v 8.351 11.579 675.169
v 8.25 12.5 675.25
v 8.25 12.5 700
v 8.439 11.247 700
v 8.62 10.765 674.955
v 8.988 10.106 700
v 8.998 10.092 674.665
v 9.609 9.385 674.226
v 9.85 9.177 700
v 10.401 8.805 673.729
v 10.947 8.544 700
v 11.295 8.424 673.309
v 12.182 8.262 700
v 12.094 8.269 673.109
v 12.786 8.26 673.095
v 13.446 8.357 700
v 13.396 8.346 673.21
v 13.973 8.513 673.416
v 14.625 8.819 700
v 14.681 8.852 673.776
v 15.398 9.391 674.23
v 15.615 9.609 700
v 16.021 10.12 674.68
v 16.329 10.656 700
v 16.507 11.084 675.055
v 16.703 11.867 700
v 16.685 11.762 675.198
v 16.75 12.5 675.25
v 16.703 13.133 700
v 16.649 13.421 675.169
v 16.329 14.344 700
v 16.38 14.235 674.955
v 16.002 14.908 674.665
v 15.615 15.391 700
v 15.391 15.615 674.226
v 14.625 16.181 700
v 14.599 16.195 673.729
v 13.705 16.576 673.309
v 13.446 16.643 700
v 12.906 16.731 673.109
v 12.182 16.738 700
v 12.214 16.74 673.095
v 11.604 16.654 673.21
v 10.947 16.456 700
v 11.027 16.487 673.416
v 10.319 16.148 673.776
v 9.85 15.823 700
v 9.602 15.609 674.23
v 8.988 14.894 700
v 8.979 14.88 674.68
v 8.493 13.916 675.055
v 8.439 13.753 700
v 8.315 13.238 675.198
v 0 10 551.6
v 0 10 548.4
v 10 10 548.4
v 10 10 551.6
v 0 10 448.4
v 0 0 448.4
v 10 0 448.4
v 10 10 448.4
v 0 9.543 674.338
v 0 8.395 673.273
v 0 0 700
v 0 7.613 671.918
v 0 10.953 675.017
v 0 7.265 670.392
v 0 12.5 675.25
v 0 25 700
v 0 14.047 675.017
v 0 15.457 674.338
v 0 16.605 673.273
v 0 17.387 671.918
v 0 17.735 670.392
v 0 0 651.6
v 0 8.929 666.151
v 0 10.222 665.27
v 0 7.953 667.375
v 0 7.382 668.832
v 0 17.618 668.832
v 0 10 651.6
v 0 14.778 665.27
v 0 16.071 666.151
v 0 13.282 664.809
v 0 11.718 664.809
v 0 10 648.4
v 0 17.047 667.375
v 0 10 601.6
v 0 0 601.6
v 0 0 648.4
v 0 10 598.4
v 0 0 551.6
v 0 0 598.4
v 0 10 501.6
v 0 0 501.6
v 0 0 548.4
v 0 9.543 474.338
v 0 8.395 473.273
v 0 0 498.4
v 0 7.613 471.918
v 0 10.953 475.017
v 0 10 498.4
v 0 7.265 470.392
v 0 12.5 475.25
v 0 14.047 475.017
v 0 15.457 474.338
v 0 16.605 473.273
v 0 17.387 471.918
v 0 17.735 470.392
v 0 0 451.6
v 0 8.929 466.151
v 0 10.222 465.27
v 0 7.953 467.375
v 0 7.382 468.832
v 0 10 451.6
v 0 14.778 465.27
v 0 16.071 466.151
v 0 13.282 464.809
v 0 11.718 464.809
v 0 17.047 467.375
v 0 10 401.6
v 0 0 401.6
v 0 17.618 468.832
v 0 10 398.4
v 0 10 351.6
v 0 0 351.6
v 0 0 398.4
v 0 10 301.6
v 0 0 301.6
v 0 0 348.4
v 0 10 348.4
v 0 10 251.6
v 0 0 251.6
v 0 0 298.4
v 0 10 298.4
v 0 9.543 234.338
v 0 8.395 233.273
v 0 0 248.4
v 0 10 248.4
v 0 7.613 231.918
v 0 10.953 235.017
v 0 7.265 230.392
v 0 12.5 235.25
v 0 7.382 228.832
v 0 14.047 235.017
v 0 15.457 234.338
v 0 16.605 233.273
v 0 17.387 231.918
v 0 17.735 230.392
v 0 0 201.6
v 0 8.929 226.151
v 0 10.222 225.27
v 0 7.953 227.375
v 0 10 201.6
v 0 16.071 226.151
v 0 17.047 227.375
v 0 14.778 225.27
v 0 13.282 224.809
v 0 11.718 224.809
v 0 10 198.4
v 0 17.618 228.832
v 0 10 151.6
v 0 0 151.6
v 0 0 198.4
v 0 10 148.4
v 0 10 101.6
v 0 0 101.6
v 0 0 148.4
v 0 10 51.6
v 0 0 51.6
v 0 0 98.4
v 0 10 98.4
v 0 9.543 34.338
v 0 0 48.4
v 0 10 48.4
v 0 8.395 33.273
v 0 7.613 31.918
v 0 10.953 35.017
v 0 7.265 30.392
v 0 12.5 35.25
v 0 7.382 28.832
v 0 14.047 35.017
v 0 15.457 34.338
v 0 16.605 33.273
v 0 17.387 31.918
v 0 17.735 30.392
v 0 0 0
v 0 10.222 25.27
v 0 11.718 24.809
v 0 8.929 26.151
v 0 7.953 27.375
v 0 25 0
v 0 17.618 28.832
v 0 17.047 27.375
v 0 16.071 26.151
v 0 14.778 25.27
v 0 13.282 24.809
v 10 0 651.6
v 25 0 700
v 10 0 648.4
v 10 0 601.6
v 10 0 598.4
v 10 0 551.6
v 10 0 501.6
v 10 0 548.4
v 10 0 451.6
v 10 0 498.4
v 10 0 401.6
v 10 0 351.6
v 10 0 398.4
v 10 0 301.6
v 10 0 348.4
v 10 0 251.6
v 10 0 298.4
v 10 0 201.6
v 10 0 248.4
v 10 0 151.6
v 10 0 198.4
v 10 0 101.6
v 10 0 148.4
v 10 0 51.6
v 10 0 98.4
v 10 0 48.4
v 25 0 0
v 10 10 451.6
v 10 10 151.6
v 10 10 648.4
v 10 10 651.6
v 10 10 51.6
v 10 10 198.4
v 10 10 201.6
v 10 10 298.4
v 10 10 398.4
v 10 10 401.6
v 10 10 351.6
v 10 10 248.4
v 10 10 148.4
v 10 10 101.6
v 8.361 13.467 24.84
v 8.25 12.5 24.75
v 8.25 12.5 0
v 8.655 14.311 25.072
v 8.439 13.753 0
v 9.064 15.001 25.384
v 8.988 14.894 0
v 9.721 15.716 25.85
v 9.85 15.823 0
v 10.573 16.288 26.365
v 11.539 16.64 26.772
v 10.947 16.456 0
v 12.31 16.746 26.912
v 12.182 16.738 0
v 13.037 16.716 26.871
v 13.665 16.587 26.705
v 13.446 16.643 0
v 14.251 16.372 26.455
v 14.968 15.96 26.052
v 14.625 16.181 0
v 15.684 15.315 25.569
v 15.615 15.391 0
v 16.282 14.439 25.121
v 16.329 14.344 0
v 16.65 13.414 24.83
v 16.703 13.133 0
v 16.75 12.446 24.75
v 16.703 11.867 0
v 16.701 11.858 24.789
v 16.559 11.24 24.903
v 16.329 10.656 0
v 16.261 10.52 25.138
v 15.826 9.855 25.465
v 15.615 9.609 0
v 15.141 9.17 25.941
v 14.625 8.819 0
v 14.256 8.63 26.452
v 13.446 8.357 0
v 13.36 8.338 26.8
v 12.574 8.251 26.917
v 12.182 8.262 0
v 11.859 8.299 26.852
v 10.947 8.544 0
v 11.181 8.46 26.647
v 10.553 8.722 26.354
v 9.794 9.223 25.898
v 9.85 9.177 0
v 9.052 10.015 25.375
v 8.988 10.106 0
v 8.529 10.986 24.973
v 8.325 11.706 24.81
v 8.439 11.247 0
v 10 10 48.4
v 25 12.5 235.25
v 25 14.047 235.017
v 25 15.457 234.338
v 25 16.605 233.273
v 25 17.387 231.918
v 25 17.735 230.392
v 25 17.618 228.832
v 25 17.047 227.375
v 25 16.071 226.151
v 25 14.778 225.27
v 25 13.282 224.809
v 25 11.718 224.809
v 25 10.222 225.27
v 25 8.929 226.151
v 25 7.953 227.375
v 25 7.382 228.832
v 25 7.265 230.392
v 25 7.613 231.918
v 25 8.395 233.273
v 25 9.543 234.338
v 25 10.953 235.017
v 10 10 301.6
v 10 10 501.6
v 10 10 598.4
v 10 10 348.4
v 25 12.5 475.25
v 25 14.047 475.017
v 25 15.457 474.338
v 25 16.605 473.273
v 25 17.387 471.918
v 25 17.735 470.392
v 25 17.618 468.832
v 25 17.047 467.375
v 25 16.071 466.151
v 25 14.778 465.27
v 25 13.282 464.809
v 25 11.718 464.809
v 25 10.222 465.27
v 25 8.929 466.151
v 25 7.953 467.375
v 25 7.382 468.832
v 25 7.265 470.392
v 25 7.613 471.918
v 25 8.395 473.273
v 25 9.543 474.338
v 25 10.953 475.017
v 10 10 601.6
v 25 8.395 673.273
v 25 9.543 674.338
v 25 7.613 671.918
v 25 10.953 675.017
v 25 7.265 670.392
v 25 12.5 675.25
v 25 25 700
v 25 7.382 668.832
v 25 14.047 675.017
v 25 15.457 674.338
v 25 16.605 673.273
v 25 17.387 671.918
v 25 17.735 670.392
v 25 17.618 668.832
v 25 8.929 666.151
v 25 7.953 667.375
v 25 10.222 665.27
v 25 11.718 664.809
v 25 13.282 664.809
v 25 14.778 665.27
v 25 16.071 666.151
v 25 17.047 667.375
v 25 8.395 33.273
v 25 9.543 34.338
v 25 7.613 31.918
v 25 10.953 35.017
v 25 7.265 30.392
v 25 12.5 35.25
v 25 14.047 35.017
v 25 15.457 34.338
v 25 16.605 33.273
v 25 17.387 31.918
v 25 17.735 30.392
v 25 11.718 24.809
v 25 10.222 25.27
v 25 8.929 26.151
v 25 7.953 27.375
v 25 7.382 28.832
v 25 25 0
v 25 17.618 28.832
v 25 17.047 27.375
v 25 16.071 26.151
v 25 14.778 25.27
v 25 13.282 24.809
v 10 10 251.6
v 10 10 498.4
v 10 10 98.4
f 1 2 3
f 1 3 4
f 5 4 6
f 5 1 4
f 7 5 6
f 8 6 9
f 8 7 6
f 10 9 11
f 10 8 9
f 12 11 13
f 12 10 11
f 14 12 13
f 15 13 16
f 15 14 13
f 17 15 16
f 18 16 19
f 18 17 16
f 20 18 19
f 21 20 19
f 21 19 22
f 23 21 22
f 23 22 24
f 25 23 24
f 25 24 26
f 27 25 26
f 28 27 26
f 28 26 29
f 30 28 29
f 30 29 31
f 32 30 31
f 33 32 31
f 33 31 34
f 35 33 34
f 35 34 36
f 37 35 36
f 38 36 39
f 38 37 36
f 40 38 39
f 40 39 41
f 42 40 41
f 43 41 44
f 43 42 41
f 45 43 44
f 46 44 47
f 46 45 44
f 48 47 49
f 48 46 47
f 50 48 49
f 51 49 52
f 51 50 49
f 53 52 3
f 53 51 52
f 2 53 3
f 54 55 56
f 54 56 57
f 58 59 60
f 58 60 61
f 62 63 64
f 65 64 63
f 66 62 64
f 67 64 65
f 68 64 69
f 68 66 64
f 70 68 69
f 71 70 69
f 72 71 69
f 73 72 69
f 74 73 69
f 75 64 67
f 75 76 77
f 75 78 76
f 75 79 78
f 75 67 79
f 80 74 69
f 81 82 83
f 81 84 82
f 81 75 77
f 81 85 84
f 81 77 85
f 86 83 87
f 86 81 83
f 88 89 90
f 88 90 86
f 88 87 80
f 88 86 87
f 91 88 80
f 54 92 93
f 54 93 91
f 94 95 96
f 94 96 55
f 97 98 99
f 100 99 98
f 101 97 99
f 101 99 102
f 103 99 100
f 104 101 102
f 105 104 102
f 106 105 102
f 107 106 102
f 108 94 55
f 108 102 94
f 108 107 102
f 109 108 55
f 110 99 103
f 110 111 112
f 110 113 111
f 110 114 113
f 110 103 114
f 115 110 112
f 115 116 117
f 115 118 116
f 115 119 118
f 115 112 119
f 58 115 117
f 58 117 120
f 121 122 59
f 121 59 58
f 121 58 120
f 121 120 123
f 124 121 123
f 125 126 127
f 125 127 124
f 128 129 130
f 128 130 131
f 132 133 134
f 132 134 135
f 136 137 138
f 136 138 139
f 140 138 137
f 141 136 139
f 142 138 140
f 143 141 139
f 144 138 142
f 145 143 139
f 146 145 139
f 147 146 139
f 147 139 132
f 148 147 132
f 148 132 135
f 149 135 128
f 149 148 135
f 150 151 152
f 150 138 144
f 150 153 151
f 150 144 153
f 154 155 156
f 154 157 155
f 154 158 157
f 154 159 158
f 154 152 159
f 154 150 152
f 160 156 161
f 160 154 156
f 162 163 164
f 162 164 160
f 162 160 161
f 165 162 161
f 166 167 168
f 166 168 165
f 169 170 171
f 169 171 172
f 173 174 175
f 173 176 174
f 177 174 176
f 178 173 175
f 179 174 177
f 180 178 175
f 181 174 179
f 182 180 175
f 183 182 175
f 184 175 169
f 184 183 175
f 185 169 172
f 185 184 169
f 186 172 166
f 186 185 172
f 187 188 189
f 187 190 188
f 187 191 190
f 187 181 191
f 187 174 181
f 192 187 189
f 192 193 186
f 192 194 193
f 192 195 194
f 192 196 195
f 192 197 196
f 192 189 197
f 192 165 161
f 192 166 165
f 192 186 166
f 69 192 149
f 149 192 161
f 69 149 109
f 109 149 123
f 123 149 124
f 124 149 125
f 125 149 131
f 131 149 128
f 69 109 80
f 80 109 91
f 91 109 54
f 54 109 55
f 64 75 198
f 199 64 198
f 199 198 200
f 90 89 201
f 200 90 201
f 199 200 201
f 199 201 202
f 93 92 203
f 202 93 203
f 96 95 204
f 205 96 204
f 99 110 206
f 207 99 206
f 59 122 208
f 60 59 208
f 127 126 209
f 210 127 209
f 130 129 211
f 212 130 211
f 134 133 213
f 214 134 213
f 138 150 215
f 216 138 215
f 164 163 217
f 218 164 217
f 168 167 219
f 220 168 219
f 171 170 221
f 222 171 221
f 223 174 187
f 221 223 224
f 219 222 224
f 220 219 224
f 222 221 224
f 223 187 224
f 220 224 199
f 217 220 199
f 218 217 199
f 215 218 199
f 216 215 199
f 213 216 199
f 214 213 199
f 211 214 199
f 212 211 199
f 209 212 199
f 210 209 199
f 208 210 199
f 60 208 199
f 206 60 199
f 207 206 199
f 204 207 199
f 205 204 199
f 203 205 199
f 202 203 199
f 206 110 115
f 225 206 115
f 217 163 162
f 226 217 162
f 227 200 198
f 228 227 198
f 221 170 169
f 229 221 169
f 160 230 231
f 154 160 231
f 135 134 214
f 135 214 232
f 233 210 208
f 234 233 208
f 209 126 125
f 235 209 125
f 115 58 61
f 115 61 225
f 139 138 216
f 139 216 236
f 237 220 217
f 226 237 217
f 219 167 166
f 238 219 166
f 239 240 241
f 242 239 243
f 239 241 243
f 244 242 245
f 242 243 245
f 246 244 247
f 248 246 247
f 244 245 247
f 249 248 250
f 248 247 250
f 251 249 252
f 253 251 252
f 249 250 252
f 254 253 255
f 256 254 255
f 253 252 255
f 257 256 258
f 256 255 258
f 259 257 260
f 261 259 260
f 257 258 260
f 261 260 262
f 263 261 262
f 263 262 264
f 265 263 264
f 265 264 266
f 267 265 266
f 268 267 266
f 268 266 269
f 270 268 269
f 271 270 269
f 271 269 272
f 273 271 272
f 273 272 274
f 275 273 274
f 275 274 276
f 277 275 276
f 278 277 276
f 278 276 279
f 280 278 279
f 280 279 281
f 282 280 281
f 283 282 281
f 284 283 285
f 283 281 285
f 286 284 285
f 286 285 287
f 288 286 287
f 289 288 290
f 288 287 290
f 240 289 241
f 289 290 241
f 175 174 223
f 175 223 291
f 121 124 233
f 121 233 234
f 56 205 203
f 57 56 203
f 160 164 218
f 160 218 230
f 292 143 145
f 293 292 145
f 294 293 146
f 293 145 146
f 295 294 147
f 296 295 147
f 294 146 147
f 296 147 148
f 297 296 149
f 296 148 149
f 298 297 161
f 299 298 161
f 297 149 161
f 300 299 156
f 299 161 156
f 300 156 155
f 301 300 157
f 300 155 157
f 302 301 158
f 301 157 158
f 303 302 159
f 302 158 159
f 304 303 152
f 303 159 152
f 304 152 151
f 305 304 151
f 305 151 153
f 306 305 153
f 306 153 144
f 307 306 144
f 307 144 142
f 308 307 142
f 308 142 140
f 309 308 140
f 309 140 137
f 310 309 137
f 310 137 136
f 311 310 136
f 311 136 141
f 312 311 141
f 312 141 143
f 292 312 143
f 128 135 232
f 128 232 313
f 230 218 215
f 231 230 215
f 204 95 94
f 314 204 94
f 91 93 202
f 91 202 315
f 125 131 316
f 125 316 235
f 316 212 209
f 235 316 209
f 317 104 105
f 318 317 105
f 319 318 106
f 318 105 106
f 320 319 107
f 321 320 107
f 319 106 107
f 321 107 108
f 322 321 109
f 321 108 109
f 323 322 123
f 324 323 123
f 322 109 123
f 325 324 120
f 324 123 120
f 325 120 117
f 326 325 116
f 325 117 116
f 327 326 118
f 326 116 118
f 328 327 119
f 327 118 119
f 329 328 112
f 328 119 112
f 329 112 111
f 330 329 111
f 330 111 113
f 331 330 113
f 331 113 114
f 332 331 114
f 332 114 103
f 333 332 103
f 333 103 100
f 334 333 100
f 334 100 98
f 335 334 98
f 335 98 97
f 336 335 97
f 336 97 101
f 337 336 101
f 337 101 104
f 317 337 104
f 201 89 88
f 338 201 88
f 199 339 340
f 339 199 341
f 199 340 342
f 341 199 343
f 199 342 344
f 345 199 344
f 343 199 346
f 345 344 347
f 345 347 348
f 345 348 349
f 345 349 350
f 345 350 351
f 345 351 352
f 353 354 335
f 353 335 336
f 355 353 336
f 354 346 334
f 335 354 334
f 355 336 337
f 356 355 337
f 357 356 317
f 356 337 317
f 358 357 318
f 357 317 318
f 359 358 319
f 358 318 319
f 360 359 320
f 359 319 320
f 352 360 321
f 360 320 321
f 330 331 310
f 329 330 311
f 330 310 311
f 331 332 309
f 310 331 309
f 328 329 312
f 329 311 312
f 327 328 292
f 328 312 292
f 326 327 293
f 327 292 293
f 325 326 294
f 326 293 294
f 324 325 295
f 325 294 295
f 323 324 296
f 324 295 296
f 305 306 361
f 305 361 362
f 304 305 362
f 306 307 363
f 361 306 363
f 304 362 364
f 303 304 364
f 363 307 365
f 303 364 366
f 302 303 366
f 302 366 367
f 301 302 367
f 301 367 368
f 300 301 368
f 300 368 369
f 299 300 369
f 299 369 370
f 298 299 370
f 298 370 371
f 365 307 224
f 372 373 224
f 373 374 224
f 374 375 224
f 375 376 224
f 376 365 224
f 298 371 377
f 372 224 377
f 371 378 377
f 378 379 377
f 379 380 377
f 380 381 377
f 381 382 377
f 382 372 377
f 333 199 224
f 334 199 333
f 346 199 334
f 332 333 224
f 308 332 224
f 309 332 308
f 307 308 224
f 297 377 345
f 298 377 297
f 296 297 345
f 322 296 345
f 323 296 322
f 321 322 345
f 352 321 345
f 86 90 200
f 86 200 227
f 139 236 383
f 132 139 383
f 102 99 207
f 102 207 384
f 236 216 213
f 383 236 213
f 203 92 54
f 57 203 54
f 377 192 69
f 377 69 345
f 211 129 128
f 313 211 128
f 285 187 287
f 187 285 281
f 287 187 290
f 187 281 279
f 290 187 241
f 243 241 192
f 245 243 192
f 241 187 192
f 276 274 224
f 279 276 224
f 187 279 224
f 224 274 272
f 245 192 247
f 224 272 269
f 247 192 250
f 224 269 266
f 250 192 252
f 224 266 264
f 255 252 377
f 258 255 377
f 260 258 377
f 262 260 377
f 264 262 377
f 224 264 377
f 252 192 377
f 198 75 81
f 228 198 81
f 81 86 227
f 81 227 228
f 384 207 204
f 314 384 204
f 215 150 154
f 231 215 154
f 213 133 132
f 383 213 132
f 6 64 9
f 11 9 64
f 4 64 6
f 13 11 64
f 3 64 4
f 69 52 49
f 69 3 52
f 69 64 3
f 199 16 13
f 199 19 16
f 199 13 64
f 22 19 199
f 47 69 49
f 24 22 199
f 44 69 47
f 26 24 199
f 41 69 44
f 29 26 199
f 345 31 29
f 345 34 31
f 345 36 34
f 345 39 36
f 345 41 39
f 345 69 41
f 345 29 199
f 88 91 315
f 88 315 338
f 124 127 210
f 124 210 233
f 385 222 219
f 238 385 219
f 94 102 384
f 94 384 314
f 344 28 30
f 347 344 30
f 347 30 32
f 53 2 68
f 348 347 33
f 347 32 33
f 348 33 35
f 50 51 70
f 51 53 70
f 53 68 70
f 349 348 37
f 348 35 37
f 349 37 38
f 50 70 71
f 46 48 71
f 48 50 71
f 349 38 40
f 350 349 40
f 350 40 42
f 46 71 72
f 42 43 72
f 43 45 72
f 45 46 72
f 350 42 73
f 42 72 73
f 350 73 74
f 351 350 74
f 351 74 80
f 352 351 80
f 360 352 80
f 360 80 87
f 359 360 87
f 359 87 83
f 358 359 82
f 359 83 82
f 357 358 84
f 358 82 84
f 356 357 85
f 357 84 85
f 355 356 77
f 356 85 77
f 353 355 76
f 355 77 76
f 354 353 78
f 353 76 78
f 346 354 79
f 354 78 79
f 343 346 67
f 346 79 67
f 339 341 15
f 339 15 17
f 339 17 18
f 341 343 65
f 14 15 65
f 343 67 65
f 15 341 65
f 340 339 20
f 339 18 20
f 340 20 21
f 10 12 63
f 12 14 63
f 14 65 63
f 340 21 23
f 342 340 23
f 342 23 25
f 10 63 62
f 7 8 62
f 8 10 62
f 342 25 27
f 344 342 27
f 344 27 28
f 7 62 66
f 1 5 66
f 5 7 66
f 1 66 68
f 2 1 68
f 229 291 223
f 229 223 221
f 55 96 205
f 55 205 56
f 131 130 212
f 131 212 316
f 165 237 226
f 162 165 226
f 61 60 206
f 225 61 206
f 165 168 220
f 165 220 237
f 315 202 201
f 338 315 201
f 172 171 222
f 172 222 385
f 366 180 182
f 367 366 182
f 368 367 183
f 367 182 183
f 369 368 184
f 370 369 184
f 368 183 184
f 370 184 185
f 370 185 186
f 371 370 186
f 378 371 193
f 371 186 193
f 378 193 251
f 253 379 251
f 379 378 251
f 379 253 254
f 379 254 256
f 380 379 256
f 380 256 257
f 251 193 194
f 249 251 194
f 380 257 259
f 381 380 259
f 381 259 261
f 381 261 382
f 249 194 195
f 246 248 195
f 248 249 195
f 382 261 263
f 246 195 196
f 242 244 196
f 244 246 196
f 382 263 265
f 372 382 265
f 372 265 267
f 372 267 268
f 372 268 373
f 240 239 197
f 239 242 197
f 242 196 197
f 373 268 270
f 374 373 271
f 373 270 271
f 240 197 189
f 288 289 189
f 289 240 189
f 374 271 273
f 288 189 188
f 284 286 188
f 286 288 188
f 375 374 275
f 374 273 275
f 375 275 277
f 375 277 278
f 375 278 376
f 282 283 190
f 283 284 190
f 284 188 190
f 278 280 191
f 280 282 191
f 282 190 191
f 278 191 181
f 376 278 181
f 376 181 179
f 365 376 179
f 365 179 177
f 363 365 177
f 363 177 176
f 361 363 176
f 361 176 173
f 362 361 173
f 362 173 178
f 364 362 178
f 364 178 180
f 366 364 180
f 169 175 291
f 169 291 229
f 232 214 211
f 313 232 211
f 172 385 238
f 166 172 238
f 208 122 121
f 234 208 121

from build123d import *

# Parameters (mm, degrees)
SKETCH_1_W          = 25
SKETCH_1_H          = 25
EXTRUDE_1_DEPTH     = 700
SKETCH_2_W          = 3.2
SKETCH_2_H          = 10
CUT_EXTRUDE_1_DEPTH = 10
SKETCH_3_R          = 5.25
CUT_EXTRUDE_2_DEPTH = 701.892288444
SKETCH_4_R          = 4.25
CUT_EXTRUDE_3_DEPTH = 30
CUT_EXTRUDE_START   = -30
SKETCH_5_R          = 4.25
CUT_EXTRUDE_4_DEPTH = 30


with BuildPart() as part:
    # Эскиз1 → Бобышка-Вытянуть1 (new body)
    with BuildSketch(Plane.XY):
        with Locations((12.5, 12.5)):
            Rectangle(SKETCH_1_W, SKETCH_1_H)
    extrude(amount=EXTRUDE_1_DEPTH)

    # Эскиз2 → Вырез-Вытянуть1 (cut)
    with BuildSketch(Plane.ZY):
        with Locations((50, 5)):
            Rectangle(SKETCH_2_W, SKETCH_2_H)
        with Locations((100, 5)):
            Rectangle(SKETCH_2_W, SKETCH_2_H)
        with Locations((150, 5)):
            Rectangle(SKETCH_2_W, SKETCH_2_H)
        with Locations((200, 5)):
            Rectangle(SKETCH_2_W, SKETCH_2_H)
        with Locations((250, 5)):
            Rectangle(SKETCH_2_W, SKETCH_2_H)
        with Locations((300, 5)):
            Rectangle(SKETCH_2_W, SKETCH_2_H)
        with Locations((350, 5)):
            Rectangle(SKETCH_2_W, SKETCH_2_H)
        with Locations((400, 5)):
            Rectangle(SKETCH_2_W, SKETCH_2_H)
        with Locations((450, 5)):
            Rectangle(SKETCH_2_W, SKETCH_2_H)
        with Locations((500, 5)):
            Rectangle(SKETCH_2_W, SKETCH_2_H)
        with Locations((550, 5)):
            Rectangle(SKETCH_2_W, SKETCH_2_H)
        with Locations((600, 5)):
            Rectangle(SKETCH_2_W, SKETCH_2_H)
        with Locations((650, 5)):
            Rectangle(SKETCH_2_W, SKETCH_2_H)
    extrude(amount=-CUT_EXTRUDE_1_DEPTH, mode=Mode.SUBTRACT)

    # Эскиз3 → Вырез-Вытянуть2 (cut, through all)
    with BuildSketch(Plane.ZY):
        with Locations((30, 12.5)):
            Circle(SKETCH_3_R)
        with Locations((670, 12.5)):
            Circle(SKETCH_3_R)
        with Locations((230, 12.5)):
            Circle(SKETCH_3_R)
        with Locations((470, 12.5)):
            Circle(SKETCH_3_R)
    extrude(amount=-CUT_EXTRUDE_2_DEPTH, mode=Mode.SUBTRACT)

    # Эскиз4 → Вырез-Вытянуть3 (cut)
    with BuildSketch(Plane(origin=(0, 0, 0), x_dir=(-1, 0, 0), z_dir=(0, 0, -1))):
        with Locations((-12.5, 12.5)):
            Circle(SKETCH_4_R)
    extrude(amount=-CUT_EXTRUDE_3_DEPTH, mode=Mode.SUBTRACT)

    # Эскиз5 → Вырез-Вытянуть4 (cut)
    with BuildSketch(Plane.XY.offset(700).offset(CUT_EXTRUDE_START)):
        with Locations(Location((12.5, 12.5, 0), (0, 0, 180))):
            Circle(SKETCH_5_R)
    extrude(amount=CUT_EXTRUDE_4_DEPTH, mode=Mode.SUBTRACT)


solid = part.part
